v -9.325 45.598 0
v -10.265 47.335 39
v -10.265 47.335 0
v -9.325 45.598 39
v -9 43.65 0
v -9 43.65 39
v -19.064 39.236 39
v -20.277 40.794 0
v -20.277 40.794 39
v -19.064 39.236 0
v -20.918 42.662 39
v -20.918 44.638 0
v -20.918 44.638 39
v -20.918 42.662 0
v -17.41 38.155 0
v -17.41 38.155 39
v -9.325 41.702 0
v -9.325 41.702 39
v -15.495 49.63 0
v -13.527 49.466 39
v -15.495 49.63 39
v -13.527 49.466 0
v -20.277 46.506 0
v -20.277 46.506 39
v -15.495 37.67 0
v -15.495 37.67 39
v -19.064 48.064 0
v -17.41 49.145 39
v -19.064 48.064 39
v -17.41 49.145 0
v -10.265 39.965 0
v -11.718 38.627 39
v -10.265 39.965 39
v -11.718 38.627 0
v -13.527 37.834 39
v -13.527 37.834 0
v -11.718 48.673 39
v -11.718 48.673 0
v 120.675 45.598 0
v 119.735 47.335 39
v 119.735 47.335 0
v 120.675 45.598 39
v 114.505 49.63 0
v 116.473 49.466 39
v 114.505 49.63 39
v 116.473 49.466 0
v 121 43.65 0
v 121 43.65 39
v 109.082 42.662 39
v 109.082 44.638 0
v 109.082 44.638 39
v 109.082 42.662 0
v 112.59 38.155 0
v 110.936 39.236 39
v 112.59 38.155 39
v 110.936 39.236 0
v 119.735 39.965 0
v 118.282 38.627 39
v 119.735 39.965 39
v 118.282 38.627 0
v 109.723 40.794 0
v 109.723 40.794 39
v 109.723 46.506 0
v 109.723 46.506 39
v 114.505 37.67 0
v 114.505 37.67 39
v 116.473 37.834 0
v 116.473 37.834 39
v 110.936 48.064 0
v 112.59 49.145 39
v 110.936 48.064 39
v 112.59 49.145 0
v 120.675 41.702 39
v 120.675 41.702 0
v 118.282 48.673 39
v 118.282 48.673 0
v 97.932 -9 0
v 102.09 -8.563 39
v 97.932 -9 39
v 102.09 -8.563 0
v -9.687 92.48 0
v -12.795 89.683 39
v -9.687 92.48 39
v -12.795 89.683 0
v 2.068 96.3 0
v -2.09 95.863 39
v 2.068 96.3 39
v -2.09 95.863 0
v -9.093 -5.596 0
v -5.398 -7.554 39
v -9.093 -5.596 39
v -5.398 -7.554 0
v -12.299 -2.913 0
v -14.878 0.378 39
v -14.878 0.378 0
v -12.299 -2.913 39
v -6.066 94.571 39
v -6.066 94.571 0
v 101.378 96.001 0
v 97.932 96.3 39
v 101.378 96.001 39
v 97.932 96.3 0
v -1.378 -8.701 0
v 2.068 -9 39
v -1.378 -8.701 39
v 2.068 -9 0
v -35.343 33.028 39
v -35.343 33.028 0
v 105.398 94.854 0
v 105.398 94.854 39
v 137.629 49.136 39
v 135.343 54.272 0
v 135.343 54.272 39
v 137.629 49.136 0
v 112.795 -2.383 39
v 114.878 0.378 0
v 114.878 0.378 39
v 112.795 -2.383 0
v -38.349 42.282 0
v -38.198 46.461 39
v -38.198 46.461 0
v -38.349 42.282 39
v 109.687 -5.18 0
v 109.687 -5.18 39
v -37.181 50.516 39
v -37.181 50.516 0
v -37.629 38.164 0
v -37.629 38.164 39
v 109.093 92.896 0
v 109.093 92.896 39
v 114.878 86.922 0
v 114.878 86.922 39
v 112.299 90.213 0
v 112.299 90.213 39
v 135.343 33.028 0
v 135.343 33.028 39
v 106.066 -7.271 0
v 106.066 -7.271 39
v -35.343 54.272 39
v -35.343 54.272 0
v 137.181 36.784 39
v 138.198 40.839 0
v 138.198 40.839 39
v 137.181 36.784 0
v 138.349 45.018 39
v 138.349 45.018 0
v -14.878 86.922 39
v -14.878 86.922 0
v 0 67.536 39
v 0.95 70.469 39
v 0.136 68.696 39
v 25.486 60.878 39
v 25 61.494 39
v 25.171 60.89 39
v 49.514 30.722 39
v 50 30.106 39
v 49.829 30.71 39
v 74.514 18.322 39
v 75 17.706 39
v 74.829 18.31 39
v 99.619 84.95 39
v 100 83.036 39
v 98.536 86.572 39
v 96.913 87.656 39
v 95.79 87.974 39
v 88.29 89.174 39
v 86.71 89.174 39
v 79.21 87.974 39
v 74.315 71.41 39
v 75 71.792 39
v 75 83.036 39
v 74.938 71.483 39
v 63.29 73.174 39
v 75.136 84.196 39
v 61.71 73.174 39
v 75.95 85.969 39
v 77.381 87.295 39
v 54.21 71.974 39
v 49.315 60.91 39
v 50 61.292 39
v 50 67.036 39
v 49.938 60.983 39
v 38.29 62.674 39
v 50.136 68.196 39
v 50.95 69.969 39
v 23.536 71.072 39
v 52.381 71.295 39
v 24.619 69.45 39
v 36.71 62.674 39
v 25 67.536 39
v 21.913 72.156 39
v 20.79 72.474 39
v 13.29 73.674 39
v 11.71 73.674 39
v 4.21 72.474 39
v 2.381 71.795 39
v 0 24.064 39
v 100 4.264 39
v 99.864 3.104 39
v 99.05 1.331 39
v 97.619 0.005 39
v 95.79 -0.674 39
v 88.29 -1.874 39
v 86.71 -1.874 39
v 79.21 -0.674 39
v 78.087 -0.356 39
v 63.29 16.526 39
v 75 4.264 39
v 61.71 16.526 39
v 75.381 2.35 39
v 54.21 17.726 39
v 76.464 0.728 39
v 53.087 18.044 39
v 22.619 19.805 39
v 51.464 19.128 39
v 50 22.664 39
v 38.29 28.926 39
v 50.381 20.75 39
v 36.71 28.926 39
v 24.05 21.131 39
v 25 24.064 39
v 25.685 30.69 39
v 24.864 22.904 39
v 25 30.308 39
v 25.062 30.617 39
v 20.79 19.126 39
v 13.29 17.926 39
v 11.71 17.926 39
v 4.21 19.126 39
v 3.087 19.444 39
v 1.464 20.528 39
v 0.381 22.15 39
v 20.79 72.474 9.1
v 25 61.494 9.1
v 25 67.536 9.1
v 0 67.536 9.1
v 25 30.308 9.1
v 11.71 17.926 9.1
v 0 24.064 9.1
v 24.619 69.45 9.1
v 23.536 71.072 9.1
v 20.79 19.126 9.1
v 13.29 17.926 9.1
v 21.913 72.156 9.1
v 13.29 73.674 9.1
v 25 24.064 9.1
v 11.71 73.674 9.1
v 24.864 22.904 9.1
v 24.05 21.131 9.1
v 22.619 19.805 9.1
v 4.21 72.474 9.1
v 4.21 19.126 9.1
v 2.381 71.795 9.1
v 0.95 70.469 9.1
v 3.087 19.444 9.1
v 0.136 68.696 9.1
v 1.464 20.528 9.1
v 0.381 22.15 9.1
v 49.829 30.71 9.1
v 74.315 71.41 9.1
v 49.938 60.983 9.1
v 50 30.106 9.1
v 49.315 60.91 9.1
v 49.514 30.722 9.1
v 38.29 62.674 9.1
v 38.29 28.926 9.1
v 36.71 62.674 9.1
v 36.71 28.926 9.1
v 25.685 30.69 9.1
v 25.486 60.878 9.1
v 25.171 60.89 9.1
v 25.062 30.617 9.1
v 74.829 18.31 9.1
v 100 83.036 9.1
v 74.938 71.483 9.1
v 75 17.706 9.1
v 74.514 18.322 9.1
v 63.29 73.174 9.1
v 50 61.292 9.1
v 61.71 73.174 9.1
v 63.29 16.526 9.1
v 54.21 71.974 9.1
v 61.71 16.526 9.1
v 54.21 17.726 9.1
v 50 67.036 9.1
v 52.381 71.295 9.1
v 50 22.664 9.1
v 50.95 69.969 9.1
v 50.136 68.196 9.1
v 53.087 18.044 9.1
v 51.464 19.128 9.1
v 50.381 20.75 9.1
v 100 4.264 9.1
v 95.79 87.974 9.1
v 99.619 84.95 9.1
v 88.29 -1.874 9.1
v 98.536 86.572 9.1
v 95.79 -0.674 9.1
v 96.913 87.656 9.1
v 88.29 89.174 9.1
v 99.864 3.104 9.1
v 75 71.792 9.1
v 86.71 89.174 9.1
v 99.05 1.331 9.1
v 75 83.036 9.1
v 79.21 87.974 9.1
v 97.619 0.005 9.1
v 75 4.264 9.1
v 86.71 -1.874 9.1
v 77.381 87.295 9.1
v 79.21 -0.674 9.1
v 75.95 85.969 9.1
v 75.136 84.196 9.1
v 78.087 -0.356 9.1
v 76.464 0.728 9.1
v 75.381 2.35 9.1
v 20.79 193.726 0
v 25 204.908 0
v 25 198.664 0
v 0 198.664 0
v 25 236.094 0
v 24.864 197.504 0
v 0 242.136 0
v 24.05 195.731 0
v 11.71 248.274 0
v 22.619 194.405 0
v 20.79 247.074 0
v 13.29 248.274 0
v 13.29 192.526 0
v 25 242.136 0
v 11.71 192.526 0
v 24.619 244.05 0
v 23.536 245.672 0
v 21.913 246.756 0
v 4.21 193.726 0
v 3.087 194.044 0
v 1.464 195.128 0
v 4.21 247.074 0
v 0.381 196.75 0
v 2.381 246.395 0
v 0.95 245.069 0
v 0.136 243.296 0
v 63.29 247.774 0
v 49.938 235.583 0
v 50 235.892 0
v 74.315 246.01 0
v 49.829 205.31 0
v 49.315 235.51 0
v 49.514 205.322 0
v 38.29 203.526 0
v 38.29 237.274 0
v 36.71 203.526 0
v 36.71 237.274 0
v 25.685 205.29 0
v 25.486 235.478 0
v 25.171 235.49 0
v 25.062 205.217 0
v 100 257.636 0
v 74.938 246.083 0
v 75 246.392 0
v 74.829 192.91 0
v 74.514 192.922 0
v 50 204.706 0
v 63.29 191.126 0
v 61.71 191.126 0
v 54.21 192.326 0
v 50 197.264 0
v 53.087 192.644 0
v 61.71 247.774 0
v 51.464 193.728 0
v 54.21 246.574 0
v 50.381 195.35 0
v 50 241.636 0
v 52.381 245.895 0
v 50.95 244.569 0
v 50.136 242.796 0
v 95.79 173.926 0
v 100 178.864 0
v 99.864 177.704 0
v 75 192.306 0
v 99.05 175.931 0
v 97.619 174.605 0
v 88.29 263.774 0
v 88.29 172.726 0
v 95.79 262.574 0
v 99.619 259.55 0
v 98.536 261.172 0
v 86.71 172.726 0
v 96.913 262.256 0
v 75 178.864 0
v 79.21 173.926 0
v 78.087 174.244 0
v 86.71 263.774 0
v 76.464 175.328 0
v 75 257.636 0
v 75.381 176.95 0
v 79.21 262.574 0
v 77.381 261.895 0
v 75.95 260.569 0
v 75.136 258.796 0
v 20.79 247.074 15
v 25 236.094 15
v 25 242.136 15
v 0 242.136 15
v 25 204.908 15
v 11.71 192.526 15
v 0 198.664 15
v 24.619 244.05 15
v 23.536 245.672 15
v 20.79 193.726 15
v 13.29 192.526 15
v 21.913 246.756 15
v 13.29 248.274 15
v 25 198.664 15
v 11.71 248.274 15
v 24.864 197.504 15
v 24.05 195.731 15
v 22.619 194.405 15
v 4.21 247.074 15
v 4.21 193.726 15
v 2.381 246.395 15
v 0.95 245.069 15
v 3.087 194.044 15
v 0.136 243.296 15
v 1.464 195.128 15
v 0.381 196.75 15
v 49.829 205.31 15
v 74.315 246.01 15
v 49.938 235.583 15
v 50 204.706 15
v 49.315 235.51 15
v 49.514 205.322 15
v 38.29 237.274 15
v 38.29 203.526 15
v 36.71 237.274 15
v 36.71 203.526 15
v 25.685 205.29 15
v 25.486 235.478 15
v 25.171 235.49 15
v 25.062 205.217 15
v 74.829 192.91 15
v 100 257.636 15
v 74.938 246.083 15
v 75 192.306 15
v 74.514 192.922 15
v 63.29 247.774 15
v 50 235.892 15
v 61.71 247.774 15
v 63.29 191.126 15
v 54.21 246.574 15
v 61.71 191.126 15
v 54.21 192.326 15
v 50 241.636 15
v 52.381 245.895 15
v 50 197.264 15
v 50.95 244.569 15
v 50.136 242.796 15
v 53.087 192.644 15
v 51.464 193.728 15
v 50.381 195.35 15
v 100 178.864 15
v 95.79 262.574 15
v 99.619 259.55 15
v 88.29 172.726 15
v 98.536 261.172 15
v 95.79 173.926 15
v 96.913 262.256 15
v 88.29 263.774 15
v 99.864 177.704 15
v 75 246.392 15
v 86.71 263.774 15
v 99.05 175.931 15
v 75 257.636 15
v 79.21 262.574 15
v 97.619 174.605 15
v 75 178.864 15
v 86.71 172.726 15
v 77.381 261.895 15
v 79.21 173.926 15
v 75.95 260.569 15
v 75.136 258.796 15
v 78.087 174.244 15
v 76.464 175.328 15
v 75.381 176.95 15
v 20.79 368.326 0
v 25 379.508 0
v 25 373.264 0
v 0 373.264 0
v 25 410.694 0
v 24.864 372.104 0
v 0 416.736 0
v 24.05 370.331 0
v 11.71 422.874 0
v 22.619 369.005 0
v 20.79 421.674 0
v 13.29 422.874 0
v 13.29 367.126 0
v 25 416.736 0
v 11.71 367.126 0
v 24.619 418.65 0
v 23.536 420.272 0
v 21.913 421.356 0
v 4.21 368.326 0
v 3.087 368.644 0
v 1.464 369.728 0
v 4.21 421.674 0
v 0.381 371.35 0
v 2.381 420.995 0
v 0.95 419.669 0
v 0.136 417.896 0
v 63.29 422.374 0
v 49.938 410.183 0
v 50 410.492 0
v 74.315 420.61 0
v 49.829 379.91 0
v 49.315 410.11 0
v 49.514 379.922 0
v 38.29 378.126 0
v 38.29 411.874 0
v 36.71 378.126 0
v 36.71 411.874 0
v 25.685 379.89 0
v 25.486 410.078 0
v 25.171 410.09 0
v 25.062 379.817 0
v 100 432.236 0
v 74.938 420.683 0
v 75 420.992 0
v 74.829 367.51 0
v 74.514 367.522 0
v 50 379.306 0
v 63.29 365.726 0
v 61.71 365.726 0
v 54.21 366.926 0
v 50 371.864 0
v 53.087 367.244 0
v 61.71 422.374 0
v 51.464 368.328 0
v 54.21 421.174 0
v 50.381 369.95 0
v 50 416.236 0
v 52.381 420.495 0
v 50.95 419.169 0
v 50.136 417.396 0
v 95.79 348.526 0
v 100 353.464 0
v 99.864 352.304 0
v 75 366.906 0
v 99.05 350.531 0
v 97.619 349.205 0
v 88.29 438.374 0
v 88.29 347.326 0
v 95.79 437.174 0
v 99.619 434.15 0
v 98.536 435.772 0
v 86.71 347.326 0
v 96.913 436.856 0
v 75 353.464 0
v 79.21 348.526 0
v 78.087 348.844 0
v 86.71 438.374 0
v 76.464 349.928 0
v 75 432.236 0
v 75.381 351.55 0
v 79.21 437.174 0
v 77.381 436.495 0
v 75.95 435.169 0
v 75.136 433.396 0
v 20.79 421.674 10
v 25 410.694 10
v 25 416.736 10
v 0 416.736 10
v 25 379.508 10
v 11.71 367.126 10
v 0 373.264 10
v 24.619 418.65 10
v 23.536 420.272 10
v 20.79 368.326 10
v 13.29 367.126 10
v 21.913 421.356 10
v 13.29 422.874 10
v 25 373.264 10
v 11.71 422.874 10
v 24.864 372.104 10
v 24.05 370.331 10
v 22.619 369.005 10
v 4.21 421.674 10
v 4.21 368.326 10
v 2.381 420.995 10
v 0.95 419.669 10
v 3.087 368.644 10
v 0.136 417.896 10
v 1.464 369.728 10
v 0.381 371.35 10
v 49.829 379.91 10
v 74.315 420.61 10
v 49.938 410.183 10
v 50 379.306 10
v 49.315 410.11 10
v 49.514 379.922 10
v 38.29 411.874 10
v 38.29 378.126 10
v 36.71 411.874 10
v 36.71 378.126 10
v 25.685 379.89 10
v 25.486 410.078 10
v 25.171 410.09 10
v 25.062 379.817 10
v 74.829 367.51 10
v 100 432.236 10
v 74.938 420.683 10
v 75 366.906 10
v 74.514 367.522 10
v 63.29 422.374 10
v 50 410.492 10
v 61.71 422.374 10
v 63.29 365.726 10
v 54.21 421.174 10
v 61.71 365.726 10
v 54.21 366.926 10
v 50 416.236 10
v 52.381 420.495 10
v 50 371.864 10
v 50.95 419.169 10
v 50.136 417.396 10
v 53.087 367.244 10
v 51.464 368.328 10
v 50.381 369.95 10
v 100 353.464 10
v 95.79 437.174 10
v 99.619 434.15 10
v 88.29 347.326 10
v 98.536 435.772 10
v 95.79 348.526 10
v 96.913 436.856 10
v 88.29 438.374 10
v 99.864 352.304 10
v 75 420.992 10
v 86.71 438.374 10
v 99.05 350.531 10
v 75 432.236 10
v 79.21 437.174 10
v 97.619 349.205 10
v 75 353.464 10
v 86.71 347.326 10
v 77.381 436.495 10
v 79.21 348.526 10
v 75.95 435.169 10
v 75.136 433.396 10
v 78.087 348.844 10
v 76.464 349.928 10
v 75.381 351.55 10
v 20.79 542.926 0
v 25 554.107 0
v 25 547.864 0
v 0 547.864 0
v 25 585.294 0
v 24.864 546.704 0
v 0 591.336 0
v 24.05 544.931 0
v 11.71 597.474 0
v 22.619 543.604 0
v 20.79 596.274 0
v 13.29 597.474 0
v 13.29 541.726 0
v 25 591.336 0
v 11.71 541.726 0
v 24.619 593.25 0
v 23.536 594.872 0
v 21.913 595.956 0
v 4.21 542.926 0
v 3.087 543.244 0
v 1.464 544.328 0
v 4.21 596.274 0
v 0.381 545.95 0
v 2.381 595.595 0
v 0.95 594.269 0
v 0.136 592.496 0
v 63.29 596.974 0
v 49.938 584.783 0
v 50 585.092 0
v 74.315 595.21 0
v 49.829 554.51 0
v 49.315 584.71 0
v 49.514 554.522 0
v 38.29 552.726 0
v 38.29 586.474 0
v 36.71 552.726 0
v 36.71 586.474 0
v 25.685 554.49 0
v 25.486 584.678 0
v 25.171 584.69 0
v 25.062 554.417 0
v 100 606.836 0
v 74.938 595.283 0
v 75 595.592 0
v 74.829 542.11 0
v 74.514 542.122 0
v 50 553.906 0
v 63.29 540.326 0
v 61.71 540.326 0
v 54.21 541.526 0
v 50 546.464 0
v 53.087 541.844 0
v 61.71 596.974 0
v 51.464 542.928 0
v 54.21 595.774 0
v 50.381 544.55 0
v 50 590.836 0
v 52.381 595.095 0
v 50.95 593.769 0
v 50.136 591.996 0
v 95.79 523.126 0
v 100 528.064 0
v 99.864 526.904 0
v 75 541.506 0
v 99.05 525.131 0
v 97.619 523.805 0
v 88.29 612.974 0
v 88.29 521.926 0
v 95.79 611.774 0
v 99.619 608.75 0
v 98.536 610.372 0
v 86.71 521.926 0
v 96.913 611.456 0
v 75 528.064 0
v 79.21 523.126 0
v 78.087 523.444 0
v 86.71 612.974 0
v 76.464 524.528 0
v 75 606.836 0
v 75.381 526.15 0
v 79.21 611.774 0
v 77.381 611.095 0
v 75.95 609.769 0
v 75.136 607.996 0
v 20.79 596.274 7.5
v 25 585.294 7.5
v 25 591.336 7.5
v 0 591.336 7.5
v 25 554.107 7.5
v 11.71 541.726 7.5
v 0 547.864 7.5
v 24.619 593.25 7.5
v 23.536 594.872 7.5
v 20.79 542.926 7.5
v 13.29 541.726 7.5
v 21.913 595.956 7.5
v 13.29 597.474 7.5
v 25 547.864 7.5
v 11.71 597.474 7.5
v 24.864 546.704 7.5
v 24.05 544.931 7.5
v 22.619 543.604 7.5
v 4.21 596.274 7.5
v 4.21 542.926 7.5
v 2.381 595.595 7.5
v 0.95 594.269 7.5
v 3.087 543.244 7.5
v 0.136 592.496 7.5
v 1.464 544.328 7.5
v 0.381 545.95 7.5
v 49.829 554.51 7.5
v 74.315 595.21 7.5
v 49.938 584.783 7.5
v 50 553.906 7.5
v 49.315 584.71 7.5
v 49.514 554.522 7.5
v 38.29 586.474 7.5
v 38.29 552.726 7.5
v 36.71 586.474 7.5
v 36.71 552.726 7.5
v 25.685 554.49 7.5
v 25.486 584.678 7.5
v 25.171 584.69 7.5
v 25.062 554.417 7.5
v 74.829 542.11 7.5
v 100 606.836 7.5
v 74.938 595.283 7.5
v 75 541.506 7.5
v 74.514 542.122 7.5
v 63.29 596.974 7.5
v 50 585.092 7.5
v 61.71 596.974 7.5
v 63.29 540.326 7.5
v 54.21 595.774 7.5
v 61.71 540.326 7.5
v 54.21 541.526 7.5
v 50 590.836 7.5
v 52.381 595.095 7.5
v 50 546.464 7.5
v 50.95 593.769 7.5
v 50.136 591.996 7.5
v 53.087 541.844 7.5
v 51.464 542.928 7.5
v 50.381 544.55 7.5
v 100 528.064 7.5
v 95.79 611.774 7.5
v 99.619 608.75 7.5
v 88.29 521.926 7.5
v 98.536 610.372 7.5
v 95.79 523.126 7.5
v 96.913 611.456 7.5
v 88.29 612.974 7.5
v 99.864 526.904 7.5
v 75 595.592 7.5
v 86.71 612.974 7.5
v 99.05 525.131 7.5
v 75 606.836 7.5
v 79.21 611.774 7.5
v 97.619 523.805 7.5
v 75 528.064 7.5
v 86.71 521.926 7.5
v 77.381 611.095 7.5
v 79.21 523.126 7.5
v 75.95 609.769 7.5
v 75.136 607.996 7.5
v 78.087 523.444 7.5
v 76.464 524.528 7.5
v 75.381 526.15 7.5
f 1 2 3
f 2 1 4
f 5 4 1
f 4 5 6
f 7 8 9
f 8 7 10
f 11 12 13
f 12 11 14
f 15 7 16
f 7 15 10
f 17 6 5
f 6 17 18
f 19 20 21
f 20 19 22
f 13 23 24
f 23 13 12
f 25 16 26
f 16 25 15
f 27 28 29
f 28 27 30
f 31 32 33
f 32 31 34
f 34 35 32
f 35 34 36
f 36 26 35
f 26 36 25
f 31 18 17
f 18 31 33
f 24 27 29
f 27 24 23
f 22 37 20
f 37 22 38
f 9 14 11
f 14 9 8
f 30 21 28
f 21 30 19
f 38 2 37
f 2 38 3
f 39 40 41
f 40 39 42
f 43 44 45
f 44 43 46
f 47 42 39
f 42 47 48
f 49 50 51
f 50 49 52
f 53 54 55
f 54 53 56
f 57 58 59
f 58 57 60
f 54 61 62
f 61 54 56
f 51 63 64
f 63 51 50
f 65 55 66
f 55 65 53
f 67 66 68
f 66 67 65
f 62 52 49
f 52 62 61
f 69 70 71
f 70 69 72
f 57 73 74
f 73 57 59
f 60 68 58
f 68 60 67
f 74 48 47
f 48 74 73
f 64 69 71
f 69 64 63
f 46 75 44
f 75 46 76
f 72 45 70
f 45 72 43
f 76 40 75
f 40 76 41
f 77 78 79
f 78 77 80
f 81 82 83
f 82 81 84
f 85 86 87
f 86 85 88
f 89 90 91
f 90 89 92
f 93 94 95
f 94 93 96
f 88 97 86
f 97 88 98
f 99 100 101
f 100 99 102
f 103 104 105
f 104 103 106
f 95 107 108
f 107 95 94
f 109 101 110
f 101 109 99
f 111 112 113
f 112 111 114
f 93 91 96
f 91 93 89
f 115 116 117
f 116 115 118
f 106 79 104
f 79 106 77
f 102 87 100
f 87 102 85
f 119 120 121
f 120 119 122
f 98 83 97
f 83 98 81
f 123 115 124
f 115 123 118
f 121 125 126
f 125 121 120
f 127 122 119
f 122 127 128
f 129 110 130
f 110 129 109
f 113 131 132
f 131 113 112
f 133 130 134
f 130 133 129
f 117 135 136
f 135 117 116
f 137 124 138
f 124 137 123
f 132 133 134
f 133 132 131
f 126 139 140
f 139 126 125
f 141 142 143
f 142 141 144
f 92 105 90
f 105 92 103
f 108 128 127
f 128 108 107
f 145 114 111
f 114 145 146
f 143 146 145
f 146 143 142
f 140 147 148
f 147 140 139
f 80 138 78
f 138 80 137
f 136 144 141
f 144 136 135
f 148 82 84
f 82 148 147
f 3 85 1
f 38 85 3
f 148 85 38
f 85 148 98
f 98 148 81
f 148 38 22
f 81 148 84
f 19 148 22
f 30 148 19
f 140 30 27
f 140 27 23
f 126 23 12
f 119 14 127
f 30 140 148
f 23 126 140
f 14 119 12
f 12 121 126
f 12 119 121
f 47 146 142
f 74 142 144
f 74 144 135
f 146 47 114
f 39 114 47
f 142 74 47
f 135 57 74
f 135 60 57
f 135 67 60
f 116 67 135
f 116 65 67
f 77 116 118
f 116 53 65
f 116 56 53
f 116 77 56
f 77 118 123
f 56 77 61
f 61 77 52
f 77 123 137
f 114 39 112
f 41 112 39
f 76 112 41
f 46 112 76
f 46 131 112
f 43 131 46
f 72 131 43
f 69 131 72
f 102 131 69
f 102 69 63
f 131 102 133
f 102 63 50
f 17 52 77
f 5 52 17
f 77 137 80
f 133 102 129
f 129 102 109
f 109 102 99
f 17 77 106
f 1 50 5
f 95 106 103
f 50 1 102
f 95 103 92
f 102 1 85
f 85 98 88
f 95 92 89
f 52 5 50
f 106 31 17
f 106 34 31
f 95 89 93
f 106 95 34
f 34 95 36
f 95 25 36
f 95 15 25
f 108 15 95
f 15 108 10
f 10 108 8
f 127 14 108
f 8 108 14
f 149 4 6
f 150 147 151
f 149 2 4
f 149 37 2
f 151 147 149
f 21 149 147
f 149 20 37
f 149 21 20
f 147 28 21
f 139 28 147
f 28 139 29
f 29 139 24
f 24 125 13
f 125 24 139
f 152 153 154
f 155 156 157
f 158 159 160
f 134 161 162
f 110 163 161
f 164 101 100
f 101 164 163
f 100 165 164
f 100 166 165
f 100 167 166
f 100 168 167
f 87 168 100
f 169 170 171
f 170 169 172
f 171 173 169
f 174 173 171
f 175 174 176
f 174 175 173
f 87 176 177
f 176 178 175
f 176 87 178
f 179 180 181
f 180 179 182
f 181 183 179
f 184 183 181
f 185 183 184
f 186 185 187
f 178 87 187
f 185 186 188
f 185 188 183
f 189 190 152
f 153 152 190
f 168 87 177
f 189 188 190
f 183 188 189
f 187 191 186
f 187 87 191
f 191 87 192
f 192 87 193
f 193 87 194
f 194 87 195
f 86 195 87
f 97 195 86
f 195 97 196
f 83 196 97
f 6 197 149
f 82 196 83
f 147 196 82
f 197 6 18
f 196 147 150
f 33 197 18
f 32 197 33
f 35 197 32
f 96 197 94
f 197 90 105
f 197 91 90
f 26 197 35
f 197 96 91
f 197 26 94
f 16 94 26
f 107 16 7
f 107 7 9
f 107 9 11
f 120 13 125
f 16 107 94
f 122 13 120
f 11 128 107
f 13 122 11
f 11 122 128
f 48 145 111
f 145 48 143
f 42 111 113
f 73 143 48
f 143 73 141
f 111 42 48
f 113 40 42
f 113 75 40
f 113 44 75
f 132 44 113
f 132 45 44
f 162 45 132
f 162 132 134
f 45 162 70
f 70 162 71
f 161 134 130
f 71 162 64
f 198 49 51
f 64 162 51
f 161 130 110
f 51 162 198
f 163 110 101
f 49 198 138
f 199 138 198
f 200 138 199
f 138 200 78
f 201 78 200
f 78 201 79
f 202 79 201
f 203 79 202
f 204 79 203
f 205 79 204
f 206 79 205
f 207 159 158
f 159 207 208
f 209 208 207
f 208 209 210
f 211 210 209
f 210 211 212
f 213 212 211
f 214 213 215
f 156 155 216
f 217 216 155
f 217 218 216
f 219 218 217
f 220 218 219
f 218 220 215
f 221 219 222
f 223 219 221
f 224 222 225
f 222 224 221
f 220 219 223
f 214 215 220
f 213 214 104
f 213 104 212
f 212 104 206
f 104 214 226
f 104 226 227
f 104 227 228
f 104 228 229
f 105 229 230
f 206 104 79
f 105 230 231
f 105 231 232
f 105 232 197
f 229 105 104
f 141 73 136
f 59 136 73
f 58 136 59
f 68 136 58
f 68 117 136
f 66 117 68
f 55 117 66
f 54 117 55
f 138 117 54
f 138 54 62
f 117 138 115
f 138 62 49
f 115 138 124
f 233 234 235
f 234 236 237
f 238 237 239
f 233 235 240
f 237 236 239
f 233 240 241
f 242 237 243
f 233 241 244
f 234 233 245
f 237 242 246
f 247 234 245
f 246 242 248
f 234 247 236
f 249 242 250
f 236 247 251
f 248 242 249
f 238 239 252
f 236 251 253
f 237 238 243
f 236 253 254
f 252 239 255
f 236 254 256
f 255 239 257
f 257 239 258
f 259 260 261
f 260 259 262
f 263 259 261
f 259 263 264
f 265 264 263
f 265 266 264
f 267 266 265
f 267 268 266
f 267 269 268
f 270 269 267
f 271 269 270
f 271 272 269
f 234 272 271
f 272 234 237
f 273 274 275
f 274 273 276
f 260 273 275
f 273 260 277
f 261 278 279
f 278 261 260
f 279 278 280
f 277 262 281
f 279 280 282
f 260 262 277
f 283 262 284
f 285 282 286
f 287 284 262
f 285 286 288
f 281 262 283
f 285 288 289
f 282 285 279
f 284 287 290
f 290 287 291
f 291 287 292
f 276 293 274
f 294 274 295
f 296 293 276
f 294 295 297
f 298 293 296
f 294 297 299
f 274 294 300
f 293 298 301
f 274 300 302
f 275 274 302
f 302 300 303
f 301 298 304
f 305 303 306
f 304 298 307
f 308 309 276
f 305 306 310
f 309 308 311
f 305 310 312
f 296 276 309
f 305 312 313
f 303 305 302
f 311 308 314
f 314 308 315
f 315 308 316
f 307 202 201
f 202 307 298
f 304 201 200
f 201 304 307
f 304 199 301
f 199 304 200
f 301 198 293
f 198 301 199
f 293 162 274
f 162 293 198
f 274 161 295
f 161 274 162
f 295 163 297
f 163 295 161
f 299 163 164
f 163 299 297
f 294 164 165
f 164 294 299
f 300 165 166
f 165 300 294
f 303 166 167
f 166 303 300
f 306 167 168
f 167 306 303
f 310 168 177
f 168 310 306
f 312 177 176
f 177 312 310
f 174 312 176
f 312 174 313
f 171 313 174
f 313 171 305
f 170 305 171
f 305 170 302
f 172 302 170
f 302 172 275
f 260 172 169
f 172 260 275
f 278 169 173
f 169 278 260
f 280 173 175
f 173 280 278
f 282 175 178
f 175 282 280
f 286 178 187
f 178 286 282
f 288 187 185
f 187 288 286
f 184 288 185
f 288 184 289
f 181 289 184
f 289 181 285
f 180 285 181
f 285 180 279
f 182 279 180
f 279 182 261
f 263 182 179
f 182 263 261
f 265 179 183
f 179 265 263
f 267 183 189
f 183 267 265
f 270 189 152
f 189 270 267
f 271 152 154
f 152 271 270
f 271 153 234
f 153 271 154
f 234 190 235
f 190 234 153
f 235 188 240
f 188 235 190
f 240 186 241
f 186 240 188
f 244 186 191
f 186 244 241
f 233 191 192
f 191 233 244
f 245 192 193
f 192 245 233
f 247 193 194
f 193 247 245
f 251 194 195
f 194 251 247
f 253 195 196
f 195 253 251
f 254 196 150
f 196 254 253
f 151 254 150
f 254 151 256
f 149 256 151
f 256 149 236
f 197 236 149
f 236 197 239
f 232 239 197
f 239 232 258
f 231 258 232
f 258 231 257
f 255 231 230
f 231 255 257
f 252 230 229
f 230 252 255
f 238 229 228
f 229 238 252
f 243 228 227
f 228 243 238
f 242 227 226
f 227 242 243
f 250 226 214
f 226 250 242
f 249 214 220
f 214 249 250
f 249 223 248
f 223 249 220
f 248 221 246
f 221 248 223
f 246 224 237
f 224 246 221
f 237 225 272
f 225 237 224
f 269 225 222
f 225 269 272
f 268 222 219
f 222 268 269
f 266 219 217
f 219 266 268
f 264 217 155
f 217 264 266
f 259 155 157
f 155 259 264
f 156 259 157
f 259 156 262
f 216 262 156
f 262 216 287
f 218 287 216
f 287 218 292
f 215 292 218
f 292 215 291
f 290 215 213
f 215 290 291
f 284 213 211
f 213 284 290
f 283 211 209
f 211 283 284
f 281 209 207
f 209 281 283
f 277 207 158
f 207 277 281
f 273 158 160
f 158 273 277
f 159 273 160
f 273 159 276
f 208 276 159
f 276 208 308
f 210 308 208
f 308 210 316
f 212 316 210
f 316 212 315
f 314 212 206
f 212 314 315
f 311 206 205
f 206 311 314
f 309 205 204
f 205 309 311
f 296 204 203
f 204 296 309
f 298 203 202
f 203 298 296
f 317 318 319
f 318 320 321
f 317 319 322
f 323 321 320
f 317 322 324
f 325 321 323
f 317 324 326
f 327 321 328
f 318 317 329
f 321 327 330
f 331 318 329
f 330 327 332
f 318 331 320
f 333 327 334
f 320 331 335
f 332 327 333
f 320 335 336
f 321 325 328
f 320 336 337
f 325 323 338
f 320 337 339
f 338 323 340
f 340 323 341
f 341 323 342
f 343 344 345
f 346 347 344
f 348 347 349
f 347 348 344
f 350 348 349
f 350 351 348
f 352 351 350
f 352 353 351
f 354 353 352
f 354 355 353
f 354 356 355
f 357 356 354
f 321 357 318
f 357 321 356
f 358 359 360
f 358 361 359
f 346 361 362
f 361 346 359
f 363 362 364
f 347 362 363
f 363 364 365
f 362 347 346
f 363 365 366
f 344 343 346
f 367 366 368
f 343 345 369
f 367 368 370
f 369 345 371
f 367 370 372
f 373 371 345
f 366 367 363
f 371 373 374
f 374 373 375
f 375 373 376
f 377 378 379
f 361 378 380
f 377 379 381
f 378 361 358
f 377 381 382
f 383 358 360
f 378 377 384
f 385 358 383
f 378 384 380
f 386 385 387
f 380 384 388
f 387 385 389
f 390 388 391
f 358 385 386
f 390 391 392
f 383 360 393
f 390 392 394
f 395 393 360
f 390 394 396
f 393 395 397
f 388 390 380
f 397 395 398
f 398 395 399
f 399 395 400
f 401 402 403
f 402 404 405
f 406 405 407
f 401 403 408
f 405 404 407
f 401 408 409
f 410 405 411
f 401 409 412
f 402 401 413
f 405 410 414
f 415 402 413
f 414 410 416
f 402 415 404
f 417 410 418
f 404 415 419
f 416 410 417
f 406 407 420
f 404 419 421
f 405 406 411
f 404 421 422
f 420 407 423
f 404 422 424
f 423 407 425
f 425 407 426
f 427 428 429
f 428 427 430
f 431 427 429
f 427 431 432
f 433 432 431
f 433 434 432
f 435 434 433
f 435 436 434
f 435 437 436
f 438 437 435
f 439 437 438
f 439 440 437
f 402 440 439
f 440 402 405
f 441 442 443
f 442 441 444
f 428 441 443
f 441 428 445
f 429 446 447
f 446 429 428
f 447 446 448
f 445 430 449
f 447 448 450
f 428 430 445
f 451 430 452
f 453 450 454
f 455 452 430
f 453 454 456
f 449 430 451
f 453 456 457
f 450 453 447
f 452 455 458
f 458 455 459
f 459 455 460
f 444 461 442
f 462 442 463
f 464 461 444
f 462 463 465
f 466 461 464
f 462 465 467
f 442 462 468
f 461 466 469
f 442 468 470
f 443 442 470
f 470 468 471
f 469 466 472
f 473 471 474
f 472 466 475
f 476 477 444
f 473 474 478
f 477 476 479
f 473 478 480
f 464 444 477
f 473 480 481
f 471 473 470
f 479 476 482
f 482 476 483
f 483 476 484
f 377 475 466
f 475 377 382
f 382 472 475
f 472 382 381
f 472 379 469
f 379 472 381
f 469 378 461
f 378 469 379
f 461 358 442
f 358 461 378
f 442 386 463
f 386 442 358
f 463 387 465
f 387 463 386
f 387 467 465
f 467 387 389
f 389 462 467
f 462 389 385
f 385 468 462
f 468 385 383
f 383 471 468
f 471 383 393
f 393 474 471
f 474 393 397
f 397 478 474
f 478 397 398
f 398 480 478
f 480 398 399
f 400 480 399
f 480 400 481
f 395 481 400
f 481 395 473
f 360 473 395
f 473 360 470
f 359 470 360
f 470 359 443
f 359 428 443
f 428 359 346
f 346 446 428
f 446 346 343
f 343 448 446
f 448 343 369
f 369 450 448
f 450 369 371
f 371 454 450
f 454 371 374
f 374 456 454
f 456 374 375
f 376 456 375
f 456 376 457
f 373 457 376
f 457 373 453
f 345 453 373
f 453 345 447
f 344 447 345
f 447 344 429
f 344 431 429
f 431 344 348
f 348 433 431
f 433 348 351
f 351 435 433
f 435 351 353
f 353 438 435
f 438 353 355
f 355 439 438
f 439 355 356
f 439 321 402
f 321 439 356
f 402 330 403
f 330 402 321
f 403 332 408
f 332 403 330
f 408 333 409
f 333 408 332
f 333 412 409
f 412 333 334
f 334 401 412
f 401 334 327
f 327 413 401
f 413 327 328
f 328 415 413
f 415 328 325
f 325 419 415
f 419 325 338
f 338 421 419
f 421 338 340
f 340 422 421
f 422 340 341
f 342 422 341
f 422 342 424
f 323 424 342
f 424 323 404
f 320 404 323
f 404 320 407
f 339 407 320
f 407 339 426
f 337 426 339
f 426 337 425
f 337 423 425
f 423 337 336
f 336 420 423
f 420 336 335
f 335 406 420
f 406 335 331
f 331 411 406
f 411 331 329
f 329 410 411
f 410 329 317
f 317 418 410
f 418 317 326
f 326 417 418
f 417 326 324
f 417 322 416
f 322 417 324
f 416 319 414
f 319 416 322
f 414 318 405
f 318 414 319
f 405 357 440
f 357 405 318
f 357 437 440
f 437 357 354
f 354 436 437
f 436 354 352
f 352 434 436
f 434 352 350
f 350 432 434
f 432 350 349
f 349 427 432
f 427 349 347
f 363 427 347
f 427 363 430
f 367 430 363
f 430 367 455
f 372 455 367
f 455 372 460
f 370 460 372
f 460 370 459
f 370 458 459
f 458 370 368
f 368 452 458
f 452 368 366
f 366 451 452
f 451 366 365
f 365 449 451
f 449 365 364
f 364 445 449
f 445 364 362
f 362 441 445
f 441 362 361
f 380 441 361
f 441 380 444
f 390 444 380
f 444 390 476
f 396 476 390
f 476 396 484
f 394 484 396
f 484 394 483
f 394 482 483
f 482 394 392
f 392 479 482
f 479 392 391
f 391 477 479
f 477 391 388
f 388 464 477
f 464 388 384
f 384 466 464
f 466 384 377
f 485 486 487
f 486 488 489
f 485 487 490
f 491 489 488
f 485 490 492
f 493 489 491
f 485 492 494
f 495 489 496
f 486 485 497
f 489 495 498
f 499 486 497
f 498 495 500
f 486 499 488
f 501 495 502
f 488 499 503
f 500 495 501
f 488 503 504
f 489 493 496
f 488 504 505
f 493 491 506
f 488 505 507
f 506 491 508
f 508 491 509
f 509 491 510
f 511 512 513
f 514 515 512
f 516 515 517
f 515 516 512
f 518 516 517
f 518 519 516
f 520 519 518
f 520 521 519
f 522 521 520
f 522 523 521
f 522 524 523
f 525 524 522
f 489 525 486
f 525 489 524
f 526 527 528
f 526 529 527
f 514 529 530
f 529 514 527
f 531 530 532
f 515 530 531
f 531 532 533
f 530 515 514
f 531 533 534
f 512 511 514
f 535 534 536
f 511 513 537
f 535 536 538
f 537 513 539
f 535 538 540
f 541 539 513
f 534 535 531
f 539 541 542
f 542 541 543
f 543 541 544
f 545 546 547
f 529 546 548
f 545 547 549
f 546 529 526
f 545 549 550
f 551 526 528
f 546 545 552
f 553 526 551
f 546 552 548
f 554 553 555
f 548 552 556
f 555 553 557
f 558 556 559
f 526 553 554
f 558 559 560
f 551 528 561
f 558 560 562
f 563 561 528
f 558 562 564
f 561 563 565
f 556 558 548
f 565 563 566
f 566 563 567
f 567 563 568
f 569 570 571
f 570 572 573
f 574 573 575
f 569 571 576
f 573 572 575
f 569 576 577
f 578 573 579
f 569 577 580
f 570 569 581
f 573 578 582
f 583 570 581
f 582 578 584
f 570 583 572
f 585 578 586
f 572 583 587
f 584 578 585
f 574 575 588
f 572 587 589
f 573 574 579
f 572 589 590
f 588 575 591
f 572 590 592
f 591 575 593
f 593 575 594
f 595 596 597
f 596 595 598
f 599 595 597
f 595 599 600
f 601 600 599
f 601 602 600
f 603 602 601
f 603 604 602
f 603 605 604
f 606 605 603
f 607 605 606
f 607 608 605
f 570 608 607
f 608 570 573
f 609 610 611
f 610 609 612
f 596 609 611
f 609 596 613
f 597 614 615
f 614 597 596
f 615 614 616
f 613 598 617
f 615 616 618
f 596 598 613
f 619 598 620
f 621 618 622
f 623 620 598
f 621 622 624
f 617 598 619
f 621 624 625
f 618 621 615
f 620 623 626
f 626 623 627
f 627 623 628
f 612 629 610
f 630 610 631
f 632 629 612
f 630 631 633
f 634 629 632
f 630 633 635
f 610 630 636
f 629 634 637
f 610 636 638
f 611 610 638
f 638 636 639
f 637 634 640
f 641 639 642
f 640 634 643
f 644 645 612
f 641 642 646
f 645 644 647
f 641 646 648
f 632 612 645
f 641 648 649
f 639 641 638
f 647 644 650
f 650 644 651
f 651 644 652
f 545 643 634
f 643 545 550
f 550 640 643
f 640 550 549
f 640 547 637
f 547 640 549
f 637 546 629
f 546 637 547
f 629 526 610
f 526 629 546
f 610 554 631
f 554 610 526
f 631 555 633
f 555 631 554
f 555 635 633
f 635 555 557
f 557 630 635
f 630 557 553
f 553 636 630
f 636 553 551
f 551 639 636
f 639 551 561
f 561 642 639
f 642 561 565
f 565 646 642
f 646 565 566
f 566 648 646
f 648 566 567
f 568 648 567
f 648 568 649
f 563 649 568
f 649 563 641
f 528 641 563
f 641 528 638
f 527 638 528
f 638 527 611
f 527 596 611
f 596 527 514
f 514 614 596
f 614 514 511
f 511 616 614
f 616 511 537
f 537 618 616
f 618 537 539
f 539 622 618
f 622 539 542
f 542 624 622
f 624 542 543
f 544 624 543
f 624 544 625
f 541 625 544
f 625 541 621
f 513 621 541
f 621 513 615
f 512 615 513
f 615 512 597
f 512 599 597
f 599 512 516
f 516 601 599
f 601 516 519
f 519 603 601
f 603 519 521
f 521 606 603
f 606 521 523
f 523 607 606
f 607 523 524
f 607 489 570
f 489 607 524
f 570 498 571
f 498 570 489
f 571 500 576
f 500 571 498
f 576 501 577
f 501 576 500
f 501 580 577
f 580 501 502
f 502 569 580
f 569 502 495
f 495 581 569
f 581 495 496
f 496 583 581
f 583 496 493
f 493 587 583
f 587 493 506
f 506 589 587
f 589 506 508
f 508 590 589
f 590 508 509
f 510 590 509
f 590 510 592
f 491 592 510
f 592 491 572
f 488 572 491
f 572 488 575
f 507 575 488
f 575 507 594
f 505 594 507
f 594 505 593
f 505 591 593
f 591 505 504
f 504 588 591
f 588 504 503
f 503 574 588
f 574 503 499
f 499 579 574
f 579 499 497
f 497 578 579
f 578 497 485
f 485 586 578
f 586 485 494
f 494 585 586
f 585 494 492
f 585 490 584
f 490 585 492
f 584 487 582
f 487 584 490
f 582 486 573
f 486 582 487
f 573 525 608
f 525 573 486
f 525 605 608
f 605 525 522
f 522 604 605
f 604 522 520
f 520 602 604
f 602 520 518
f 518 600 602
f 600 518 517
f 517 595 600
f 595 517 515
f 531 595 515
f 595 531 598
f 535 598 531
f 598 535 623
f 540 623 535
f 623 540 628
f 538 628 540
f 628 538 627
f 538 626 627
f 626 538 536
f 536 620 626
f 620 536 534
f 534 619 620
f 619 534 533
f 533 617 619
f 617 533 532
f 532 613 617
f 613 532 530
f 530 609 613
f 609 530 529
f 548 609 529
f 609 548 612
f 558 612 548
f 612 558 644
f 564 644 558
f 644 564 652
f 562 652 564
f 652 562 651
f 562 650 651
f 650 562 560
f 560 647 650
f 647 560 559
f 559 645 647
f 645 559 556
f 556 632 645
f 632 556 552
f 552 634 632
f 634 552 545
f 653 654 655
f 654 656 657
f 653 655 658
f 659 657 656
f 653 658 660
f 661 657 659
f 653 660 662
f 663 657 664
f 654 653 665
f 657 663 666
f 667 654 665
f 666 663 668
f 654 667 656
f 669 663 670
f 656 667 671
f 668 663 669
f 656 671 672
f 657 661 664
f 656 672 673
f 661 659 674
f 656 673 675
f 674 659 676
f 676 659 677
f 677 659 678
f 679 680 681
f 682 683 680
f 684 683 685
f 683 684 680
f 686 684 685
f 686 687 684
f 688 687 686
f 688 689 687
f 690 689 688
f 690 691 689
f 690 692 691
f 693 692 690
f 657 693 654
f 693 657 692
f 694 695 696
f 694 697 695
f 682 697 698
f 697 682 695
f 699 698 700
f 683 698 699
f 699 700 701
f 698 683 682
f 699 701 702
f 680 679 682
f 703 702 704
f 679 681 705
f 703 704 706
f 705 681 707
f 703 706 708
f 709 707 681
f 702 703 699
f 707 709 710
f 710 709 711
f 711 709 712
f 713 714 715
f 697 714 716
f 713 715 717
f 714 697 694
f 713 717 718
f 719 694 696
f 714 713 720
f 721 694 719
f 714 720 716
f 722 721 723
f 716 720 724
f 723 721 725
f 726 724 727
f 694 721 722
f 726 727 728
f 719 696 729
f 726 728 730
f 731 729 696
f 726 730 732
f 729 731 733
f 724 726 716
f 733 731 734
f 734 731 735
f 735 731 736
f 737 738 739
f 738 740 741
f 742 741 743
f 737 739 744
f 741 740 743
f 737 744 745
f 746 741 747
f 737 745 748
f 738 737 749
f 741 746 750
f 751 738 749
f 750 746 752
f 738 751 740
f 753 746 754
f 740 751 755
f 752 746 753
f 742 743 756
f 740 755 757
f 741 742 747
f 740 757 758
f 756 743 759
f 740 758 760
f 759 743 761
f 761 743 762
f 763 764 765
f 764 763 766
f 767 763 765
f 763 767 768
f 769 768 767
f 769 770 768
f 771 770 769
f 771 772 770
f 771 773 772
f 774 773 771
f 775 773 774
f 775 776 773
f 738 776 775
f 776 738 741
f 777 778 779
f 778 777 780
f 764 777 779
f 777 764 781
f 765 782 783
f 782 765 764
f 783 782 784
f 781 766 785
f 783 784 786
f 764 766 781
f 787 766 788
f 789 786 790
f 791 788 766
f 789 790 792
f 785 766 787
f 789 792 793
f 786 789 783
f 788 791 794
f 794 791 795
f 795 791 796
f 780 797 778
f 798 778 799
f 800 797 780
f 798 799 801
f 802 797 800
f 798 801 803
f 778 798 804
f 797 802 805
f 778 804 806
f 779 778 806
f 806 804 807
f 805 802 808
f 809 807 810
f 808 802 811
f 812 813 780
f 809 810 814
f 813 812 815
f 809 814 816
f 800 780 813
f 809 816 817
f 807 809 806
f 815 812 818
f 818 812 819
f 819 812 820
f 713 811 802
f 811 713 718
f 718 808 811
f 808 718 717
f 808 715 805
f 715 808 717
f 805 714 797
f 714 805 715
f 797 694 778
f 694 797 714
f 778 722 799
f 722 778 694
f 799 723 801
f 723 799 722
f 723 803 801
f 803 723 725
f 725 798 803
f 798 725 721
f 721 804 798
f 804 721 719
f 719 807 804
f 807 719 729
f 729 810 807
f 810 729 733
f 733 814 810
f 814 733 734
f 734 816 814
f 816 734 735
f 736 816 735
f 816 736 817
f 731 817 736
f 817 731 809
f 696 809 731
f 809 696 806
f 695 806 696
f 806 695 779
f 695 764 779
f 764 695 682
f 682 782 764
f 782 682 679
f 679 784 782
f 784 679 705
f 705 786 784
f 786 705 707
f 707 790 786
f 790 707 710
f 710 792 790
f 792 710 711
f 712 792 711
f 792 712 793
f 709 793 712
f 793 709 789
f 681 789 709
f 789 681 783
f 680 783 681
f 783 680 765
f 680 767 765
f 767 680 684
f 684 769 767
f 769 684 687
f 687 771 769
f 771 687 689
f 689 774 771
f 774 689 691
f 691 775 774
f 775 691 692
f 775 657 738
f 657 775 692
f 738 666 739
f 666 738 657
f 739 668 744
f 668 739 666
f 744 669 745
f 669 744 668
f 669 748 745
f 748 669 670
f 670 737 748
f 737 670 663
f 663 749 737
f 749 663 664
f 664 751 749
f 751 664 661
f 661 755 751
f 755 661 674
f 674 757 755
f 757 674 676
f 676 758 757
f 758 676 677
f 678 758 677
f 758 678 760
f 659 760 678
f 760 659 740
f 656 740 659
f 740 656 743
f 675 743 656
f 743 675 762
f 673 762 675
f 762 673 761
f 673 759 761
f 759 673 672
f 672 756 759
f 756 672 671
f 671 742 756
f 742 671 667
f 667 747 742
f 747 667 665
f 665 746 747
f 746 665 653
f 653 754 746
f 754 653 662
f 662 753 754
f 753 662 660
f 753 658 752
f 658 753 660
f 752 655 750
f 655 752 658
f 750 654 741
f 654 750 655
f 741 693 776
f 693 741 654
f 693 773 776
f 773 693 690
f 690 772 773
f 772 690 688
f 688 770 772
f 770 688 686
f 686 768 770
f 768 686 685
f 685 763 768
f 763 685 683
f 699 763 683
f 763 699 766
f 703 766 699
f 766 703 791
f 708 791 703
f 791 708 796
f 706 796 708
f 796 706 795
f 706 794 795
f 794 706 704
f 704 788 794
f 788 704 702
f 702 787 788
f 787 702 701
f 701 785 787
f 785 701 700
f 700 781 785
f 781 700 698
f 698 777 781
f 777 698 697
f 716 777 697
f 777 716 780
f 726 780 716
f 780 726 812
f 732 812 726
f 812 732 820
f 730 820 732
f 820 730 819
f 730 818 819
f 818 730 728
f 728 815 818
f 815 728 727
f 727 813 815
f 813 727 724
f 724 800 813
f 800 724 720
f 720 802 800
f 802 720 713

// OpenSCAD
/* [Finger lengths] */
// Right hand index finger height
h2_right = 19.8;
// Right hand middle finger height
h3_right = 30.8;
// Right hand ring finger height
h4_right = 18.4;
// Right hand pinky finger height
h5_right = 0;

// Left hand index finger height
h2_left = 15.5;
// Left hand middle finger height
h3_left = 26.5;
// Left hand ring finger height
h4_left = 16;
// Left hand pinky finger height
h5_left = 0;

/* [Other settings] */

// Width for each finger position
finger_width = 25; // [5:40]
// How deep the hangboard is
base_depth = 30; // [5:60]

// Distance between the two middle fingers surfaces
distance_between_hands = 30;

/* [Inserts] */

// Create inserts to reduce the depth of the hangboard?
create_inserts = "yes";  // [yes,no]

// Depth of the inserts. To remove the inserts, define an empty list
inserts_depth = [base_depth/2, base_depth/3, base_depth/4];

/* [Advanced settings] */

// Thickness of the frame walls
frame_thickness = 9; // [5:15]

// Radius of the holes in the frame
hole_radius = 6; // [4:12]

finger_platform_concavity_depth = 2;

distance_between_bases = distance_between_hands + h3_right + h3_left;

// The object to be subsctracted from the frame, with "negative fillets"
module insert(width, corner_radius=5) {
    right_hand = [h2_right, h3_right, h4_right, h5_right];
    left_hand = [h2_left, h3_left, h4_left, h5_left];

    function finger_points(hand, start, reverse=false) =
        [for (i = [0:3])
            for (j = [0:2])
                (j == 0) ?
                    [(start + (reverse ? -1 : 1) * i) * finger_width,
                    reverse ? (distance_between_bases - hand[3-i]) : hand[i],
                    ] :
                (j == 1) ?
                    [(start + (reverse ? -1 : 1) * i) * finger_width + (reverse ? -1 : 1) * finger_width/2,
                    (reverse ? (distance_between_bases - hand[3-i]) : hand[i]) + (reverse ? 1 : -1) * finger_platform_concavity_depth,
                    ] :
                    [(start + (reverse ? -1 : 1) * i) * finger_width + (reverse ? -1 : 1) * finger_width,
                    reverse ? (distance_between_bases - hand[3-i]) : hand[i],
                    ]
        ];

    radiiPoints = concat(
        finger_points(right_hand, 0),
        finger_points(left_hand, 4, true)
    );

    linear_extrude(height=width)
      offset(r = corner_radius)
        offset(r = -corner_radius)
          polygon(radiiPoints);
}

// Main structure of the hangboard
module frame(corner_radius = 20) {
  radiiPoints = [
    [-frame_thickness, -frame_thickness],
    [4*finger_width+frame_thickness, -frame_thickness],
    [4*finger_width+frame_thickness*4+hole_radius, distance_between_bases/2],
    [4*finger_width+frame_thickness, distance_between_bases+frame_thickness],
    [-frame_thickness, distance_between_bases+frame_thickness],
    [-frame_thickness*4-hole_radius, distance_between_bases/2],
  ];

  linear_extrude(height=base_depth+frame_thickness)
    offset(r = corner_radius)
      offset(r = -corner_radius)
        polygon(radiiPoints);
}

// Two holes to pass the rope
module holes() {
  translate([-hole_radius-frame_thickness, distance_between_bases/2, 0])
    linear_extrude(height=base_depth+frame_thickness+0.2)
      circle(hole_radius);
  translate([+hole_radius+frame_thickness+4*finger_width, distance_between_bases/2, 0])
    linear_extrude(height=base_depth+frame_thickness+0.2)
      circle(hole_radius);
}

// Remove from the frame the insert and the holes
difference() {
  frame();
  translate([0,0,-0.1])
    holes();
  translate([0,0,frame_thickness+0.1])
    insert(width=base_depth+0.1);
}

// Optional, create external inserts to reduce the depth of hangboard
if (create_inserts == "yes") {
  for (i  = [0:len(inserts_depth)-1]) {
    translate([0,distance_between_bases*2*(1+i),0])
      insert(width=inserts_depth[i]);
  }
}
